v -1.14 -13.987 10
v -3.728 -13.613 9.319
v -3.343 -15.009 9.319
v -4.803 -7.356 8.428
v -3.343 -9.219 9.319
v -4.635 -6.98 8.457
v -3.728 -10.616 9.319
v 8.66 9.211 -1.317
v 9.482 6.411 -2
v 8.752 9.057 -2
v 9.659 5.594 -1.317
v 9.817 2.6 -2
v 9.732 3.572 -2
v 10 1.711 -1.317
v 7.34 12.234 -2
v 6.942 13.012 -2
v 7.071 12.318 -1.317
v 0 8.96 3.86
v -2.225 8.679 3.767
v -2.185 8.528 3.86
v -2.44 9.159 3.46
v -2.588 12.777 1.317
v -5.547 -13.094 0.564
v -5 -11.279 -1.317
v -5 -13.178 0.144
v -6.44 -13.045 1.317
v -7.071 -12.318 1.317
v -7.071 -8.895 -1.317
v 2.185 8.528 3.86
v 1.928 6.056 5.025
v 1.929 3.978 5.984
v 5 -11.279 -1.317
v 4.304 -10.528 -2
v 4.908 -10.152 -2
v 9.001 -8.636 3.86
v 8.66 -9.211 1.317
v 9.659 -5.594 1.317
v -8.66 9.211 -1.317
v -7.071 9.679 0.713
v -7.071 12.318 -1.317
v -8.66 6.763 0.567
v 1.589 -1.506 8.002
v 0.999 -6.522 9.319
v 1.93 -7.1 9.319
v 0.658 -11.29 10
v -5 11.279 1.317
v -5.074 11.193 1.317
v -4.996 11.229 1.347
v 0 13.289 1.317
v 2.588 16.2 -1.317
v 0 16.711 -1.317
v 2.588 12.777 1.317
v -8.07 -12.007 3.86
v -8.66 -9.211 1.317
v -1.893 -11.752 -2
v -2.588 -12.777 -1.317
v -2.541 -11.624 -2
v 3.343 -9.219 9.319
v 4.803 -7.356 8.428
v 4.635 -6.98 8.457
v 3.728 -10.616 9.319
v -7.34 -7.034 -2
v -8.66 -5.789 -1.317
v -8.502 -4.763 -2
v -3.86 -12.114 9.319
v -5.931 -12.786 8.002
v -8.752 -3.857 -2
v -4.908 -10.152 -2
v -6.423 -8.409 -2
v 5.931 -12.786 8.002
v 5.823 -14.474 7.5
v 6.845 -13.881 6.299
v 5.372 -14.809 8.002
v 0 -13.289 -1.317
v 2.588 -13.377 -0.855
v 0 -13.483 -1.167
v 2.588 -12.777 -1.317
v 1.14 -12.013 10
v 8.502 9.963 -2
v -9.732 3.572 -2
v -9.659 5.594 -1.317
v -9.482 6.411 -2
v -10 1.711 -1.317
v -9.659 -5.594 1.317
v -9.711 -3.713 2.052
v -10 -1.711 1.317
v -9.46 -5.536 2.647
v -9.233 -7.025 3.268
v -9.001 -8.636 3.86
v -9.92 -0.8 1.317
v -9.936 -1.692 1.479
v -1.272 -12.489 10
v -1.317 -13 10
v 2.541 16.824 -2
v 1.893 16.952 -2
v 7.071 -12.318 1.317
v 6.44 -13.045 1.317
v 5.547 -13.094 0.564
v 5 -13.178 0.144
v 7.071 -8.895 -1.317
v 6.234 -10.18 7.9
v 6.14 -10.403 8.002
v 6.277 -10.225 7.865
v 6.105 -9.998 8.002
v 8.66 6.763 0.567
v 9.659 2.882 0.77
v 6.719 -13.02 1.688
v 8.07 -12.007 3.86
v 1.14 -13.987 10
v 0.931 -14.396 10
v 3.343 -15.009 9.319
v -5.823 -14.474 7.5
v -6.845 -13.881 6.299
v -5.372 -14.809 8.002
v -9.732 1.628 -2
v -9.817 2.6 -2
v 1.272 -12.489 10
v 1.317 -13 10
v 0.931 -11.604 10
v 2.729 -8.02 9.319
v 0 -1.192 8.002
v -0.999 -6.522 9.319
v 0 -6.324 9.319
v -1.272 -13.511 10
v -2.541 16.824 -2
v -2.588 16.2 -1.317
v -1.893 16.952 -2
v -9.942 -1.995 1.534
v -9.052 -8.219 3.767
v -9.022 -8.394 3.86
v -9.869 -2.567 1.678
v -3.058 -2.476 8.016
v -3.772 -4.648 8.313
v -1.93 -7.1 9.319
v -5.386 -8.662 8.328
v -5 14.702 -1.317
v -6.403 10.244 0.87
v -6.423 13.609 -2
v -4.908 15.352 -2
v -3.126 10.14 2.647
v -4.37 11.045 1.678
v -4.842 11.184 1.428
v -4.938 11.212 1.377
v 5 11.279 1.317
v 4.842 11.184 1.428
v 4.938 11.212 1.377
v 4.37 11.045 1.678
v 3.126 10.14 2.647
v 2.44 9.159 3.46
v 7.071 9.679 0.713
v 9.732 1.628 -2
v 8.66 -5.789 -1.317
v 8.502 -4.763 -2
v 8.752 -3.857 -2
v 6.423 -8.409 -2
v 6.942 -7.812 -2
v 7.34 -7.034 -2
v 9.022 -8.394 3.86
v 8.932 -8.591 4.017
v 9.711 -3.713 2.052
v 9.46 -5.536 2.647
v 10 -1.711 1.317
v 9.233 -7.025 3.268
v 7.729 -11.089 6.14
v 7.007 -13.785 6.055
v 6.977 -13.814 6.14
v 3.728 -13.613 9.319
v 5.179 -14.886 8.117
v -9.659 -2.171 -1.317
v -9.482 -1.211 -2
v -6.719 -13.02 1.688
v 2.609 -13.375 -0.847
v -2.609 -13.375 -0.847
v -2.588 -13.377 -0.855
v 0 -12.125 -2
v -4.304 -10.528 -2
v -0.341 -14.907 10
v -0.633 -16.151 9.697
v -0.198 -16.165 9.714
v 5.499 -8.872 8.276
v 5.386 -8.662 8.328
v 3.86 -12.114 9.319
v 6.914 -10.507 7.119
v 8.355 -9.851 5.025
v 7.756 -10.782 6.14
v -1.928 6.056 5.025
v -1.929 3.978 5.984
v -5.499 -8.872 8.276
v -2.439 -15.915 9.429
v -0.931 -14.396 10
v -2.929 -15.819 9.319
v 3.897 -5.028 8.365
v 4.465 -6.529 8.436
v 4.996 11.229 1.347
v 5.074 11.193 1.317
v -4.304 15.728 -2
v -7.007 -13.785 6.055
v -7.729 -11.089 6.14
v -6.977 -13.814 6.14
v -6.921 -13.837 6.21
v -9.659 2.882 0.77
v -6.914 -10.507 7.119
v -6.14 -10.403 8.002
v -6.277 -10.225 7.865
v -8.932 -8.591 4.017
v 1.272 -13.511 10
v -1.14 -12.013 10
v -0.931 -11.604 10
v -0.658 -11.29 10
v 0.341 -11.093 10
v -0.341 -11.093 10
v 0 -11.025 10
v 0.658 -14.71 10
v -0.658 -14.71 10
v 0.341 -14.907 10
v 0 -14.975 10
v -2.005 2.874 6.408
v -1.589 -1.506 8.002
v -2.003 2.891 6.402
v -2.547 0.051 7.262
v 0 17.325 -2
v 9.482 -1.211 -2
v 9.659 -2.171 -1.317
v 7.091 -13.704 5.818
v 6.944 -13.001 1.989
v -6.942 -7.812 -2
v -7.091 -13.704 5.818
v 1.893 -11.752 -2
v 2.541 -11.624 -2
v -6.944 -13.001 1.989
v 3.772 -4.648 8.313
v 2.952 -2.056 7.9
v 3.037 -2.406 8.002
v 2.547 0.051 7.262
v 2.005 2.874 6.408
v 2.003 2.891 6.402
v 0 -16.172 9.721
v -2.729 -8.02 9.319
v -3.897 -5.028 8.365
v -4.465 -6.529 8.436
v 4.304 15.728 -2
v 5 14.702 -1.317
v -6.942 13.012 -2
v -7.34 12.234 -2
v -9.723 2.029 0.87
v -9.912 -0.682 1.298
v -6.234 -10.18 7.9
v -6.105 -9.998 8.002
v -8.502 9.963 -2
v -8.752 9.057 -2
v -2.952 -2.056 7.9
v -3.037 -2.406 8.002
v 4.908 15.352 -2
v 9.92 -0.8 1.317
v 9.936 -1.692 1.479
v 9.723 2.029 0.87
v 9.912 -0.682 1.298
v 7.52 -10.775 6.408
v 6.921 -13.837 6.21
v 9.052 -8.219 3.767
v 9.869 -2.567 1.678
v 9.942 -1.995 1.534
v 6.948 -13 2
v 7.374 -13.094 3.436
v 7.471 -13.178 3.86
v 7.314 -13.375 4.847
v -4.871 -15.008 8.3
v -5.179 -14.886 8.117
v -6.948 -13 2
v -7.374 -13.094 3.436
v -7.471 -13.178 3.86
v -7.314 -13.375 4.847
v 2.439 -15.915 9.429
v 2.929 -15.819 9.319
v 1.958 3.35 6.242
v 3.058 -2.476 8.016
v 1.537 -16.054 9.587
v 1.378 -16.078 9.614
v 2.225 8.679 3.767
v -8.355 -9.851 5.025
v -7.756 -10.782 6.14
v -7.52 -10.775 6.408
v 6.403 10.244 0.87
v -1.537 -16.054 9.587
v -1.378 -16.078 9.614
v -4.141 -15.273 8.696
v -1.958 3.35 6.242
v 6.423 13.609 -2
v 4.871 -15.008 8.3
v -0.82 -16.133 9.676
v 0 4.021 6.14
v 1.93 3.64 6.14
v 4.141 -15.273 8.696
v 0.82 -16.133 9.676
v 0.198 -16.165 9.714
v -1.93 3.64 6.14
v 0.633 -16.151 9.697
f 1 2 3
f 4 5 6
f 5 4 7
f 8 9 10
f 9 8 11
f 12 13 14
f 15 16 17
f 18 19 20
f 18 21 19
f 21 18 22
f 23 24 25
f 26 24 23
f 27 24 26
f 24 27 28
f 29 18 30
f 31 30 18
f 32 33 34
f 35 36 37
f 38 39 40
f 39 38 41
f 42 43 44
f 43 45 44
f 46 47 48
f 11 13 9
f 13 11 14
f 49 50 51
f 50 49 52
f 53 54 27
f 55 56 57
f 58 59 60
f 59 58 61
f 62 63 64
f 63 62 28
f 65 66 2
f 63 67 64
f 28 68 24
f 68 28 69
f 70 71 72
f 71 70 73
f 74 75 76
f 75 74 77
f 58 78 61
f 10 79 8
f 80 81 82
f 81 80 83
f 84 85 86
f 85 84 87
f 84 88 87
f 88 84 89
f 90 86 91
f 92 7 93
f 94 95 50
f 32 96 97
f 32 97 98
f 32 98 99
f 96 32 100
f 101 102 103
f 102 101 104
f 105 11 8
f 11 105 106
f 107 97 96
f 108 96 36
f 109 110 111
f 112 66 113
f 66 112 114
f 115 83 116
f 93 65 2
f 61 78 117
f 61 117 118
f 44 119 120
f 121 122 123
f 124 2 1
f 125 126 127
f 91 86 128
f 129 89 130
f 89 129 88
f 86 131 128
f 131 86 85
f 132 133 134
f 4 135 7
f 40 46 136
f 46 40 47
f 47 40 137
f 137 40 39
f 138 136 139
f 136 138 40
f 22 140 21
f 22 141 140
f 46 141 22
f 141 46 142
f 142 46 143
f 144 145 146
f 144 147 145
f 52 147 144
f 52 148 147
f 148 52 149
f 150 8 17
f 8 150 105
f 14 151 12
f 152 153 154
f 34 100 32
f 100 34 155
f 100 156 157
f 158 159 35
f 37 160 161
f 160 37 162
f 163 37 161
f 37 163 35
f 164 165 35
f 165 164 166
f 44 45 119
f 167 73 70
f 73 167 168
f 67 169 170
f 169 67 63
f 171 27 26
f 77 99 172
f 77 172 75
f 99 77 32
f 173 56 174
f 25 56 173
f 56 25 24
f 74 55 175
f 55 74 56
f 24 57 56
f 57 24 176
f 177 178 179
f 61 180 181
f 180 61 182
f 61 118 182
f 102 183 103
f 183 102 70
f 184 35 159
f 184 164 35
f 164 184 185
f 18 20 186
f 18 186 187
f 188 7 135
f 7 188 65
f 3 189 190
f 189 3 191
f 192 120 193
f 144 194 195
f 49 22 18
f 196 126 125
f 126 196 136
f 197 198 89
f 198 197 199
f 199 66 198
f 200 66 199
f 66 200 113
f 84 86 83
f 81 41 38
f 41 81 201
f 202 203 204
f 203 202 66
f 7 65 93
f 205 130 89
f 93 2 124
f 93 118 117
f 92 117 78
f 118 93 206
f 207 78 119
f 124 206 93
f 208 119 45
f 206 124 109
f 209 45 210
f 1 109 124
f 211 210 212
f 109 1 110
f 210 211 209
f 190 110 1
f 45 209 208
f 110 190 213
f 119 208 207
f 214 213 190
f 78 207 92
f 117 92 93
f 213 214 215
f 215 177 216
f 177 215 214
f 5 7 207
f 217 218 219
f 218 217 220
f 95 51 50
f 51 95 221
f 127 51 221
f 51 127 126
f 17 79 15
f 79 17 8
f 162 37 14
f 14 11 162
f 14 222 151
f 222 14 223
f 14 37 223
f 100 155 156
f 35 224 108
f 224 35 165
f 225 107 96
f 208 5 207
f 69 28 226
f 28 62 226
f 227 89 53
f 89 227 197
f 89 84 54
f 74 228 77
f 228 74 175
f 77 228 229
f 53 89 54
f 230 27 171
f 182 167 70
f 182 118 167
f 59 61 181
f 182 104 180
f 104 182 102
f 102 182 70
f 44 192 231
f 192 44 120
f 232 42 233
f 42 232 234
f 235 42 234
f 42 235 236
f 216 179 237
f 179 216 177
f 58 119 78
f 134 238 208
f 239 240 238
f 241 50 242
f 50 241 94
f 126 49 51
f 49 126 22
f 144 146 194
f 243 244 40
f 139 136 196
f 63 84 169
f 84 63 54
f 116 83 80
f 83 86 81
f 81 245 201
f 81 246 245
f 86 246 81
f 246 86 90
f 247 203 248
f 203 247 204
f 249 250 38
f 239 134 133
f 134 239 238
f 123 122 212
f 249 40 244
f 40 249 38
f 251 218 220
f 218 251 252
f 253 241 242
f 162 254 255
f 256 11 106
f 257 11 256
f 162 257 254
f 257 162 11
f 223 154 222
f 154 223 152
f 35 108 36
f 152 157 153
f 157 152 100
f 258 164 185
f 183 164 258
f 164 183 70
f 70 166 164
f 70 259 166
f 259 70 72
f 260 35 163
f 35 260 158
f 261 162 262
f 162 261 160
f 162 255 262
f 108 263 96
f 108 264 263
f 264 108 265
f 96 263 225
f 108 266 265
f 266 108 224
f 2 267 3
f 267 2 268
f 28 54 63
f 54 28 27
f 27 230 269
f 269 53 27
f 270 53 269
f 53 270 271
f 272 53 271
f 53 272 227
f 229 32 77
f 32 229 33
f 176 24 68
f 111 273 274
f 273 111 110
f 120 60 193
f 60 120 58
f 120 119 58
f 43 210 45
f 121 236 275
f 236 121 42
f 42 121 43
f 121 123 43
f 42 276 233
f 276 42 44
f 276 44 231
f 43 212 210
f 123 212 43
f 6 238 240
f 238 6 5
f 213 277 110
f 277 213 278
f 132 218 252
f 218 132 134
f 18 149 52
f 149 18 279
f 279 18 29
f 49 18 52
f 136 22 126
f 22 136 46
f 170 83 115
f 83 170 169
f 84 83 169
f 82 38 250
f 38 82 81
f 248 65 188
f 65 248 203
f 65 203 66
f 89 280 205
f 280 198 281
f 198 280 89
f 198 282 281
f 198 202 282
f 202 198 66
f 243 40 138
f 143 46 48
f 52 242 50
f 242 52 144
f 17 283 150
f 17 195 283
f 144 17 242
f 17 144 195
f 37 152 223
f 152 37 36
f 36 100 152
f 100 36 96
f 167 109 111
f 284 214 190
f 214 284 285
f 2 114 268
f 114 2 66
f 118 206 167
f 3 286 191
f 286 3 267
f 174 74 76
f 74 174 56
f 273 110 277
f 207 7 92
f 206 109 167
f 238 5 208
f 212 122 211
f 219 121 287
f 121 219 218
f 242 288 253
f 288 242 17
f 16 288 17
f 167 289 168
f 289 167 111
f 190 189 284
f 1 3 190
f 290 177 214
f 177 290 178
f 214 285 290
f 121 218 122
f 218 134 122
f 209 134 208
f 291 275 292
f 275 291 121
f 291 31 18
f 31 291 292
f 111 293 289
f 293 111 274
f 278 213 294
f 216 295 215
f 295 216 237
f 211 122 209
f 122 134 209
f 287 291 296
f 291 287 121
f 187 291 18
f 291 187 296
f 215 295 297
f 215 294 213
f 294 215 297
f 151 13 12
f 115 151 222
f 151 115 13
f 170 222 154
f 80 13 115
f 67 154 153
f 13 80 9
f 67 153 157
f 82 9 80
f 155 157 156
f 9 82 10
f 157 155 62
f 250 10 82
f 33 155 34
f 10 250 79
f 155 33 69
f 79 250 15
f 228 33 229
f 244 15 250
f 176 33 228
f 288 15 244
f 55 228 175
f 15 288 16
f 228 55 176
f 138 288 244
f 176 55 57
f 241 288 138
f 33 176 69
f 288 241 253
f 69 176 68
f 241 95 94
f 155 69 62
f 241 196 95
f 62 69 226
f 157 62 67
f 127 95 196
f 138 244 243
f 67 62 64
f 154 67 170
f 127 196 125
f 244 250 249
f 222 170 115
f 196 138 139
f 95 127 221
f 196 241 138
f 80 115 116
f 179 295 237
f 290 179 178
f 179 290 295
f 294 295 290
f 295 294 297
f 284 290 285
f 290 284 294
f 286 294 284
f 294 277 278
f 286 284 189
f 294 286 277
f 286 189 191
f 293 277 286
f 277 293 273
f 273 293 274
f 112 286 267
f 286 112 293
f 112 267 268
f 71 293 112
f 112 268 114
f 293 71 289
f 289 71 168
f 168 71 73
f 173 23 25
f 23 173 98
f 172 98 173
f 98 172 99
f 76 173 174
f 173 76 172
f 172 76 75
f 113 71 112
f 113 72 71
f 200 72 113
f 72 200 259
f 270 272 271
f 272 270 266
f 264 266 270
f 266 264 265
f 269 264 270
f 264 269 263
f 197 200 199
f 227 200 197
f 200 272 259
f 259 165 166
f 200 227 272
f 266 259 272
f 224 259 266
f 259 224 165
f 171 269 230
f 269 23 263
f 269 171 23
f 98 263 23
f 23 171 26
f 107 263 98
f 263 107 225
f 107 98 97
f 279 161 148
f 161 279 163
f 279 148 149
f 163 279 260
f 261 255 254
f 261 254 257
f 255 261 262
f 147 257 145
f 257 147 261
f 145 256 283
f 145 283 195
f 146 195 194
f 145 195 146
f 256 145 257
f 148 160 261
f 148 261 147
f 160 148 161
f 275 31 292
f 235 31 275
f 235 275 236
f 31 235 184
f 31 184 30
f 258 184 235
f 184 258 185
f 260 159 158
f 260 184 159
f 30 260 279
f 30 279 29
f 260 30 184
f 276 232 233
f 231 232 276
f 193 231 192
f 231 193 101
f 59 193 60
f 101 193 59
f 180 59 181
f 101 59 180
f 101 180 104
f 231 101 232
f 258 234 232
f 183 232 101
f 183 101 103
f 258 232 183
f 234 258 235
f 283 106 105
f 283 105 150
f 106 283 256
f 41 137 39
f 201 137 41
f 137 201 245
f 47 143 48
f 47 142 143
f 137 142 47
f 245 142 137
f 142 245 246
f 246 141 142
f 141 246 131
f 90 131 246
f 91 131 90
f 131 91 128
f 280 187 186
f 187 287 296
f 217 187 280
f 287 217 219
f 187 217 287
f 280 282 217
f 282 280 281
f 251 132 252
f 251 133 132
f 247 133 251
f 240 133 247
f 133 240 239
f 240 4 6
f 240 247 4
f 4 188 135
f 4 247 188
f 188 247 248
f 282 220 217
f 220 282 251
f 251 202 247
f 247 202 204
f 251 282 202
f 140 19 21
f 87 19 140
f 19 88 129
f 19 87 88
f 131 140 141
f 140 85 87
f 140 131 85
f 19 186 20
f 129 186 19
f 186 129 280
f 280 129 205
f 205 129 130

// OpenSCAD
module bodyX() {
   multmatrix(m = [ [1, 0, 0, 0],
                 [0, 1, -1.1, 0],
                 [0, 0, 1, 0],
                 [0, 0, 0, 1] ])
    resize([20,30,10])
       cylinder(r1=34,r2=1,h=10,center=true,$fn=24);
}
module body0() {
   multmatrix(m = [ [1, 0,    0,   0],
                    [0,  1, -1.3,   0],
                    [0,  0,    1, 0],
                    [0,  0,    0,   1] ])
    resize([20,30,20])
       sphere(r=10,center=true,$fn=24);
}
module body() {
difference() {
	body0();
   translate([0,0,-6])
		cube([60,60,8],center=true);
  }
}
module scale() {
   
difference() {
	body();
   difference() {
	translate([0,-24,2])
     rotate([0,90,0])
       cylinder(r=11,h=20,center=true,$fn=48);
      translate([0,0,-5.2]) cube([100,100,2],center=true);
   }
   difference() {
	translate([18,0,16.4])
     rotate([90,0,22])
       cylinder(r=17,h=80,center=true,$fn=60);
      translate([0,0,-5.2]) cube([100,100,2],center=true);
   }
   difference() {
	 translate([-18,0,16.4])
     rotate([90,0,-22])
       cylinder(r=17,h=80,center=true,$fn=60);
      translate([0,0,-5.2]) cube([100,100,2],center=true);
   }
}
}

//translate([20,0,0])
//   rotate([-35,0,0])
      scale();
//translate([0,20,0]) rotate([0,45,0])   scale();
//translate([0,0,15]) rotate([0,-60,45]) scale();
